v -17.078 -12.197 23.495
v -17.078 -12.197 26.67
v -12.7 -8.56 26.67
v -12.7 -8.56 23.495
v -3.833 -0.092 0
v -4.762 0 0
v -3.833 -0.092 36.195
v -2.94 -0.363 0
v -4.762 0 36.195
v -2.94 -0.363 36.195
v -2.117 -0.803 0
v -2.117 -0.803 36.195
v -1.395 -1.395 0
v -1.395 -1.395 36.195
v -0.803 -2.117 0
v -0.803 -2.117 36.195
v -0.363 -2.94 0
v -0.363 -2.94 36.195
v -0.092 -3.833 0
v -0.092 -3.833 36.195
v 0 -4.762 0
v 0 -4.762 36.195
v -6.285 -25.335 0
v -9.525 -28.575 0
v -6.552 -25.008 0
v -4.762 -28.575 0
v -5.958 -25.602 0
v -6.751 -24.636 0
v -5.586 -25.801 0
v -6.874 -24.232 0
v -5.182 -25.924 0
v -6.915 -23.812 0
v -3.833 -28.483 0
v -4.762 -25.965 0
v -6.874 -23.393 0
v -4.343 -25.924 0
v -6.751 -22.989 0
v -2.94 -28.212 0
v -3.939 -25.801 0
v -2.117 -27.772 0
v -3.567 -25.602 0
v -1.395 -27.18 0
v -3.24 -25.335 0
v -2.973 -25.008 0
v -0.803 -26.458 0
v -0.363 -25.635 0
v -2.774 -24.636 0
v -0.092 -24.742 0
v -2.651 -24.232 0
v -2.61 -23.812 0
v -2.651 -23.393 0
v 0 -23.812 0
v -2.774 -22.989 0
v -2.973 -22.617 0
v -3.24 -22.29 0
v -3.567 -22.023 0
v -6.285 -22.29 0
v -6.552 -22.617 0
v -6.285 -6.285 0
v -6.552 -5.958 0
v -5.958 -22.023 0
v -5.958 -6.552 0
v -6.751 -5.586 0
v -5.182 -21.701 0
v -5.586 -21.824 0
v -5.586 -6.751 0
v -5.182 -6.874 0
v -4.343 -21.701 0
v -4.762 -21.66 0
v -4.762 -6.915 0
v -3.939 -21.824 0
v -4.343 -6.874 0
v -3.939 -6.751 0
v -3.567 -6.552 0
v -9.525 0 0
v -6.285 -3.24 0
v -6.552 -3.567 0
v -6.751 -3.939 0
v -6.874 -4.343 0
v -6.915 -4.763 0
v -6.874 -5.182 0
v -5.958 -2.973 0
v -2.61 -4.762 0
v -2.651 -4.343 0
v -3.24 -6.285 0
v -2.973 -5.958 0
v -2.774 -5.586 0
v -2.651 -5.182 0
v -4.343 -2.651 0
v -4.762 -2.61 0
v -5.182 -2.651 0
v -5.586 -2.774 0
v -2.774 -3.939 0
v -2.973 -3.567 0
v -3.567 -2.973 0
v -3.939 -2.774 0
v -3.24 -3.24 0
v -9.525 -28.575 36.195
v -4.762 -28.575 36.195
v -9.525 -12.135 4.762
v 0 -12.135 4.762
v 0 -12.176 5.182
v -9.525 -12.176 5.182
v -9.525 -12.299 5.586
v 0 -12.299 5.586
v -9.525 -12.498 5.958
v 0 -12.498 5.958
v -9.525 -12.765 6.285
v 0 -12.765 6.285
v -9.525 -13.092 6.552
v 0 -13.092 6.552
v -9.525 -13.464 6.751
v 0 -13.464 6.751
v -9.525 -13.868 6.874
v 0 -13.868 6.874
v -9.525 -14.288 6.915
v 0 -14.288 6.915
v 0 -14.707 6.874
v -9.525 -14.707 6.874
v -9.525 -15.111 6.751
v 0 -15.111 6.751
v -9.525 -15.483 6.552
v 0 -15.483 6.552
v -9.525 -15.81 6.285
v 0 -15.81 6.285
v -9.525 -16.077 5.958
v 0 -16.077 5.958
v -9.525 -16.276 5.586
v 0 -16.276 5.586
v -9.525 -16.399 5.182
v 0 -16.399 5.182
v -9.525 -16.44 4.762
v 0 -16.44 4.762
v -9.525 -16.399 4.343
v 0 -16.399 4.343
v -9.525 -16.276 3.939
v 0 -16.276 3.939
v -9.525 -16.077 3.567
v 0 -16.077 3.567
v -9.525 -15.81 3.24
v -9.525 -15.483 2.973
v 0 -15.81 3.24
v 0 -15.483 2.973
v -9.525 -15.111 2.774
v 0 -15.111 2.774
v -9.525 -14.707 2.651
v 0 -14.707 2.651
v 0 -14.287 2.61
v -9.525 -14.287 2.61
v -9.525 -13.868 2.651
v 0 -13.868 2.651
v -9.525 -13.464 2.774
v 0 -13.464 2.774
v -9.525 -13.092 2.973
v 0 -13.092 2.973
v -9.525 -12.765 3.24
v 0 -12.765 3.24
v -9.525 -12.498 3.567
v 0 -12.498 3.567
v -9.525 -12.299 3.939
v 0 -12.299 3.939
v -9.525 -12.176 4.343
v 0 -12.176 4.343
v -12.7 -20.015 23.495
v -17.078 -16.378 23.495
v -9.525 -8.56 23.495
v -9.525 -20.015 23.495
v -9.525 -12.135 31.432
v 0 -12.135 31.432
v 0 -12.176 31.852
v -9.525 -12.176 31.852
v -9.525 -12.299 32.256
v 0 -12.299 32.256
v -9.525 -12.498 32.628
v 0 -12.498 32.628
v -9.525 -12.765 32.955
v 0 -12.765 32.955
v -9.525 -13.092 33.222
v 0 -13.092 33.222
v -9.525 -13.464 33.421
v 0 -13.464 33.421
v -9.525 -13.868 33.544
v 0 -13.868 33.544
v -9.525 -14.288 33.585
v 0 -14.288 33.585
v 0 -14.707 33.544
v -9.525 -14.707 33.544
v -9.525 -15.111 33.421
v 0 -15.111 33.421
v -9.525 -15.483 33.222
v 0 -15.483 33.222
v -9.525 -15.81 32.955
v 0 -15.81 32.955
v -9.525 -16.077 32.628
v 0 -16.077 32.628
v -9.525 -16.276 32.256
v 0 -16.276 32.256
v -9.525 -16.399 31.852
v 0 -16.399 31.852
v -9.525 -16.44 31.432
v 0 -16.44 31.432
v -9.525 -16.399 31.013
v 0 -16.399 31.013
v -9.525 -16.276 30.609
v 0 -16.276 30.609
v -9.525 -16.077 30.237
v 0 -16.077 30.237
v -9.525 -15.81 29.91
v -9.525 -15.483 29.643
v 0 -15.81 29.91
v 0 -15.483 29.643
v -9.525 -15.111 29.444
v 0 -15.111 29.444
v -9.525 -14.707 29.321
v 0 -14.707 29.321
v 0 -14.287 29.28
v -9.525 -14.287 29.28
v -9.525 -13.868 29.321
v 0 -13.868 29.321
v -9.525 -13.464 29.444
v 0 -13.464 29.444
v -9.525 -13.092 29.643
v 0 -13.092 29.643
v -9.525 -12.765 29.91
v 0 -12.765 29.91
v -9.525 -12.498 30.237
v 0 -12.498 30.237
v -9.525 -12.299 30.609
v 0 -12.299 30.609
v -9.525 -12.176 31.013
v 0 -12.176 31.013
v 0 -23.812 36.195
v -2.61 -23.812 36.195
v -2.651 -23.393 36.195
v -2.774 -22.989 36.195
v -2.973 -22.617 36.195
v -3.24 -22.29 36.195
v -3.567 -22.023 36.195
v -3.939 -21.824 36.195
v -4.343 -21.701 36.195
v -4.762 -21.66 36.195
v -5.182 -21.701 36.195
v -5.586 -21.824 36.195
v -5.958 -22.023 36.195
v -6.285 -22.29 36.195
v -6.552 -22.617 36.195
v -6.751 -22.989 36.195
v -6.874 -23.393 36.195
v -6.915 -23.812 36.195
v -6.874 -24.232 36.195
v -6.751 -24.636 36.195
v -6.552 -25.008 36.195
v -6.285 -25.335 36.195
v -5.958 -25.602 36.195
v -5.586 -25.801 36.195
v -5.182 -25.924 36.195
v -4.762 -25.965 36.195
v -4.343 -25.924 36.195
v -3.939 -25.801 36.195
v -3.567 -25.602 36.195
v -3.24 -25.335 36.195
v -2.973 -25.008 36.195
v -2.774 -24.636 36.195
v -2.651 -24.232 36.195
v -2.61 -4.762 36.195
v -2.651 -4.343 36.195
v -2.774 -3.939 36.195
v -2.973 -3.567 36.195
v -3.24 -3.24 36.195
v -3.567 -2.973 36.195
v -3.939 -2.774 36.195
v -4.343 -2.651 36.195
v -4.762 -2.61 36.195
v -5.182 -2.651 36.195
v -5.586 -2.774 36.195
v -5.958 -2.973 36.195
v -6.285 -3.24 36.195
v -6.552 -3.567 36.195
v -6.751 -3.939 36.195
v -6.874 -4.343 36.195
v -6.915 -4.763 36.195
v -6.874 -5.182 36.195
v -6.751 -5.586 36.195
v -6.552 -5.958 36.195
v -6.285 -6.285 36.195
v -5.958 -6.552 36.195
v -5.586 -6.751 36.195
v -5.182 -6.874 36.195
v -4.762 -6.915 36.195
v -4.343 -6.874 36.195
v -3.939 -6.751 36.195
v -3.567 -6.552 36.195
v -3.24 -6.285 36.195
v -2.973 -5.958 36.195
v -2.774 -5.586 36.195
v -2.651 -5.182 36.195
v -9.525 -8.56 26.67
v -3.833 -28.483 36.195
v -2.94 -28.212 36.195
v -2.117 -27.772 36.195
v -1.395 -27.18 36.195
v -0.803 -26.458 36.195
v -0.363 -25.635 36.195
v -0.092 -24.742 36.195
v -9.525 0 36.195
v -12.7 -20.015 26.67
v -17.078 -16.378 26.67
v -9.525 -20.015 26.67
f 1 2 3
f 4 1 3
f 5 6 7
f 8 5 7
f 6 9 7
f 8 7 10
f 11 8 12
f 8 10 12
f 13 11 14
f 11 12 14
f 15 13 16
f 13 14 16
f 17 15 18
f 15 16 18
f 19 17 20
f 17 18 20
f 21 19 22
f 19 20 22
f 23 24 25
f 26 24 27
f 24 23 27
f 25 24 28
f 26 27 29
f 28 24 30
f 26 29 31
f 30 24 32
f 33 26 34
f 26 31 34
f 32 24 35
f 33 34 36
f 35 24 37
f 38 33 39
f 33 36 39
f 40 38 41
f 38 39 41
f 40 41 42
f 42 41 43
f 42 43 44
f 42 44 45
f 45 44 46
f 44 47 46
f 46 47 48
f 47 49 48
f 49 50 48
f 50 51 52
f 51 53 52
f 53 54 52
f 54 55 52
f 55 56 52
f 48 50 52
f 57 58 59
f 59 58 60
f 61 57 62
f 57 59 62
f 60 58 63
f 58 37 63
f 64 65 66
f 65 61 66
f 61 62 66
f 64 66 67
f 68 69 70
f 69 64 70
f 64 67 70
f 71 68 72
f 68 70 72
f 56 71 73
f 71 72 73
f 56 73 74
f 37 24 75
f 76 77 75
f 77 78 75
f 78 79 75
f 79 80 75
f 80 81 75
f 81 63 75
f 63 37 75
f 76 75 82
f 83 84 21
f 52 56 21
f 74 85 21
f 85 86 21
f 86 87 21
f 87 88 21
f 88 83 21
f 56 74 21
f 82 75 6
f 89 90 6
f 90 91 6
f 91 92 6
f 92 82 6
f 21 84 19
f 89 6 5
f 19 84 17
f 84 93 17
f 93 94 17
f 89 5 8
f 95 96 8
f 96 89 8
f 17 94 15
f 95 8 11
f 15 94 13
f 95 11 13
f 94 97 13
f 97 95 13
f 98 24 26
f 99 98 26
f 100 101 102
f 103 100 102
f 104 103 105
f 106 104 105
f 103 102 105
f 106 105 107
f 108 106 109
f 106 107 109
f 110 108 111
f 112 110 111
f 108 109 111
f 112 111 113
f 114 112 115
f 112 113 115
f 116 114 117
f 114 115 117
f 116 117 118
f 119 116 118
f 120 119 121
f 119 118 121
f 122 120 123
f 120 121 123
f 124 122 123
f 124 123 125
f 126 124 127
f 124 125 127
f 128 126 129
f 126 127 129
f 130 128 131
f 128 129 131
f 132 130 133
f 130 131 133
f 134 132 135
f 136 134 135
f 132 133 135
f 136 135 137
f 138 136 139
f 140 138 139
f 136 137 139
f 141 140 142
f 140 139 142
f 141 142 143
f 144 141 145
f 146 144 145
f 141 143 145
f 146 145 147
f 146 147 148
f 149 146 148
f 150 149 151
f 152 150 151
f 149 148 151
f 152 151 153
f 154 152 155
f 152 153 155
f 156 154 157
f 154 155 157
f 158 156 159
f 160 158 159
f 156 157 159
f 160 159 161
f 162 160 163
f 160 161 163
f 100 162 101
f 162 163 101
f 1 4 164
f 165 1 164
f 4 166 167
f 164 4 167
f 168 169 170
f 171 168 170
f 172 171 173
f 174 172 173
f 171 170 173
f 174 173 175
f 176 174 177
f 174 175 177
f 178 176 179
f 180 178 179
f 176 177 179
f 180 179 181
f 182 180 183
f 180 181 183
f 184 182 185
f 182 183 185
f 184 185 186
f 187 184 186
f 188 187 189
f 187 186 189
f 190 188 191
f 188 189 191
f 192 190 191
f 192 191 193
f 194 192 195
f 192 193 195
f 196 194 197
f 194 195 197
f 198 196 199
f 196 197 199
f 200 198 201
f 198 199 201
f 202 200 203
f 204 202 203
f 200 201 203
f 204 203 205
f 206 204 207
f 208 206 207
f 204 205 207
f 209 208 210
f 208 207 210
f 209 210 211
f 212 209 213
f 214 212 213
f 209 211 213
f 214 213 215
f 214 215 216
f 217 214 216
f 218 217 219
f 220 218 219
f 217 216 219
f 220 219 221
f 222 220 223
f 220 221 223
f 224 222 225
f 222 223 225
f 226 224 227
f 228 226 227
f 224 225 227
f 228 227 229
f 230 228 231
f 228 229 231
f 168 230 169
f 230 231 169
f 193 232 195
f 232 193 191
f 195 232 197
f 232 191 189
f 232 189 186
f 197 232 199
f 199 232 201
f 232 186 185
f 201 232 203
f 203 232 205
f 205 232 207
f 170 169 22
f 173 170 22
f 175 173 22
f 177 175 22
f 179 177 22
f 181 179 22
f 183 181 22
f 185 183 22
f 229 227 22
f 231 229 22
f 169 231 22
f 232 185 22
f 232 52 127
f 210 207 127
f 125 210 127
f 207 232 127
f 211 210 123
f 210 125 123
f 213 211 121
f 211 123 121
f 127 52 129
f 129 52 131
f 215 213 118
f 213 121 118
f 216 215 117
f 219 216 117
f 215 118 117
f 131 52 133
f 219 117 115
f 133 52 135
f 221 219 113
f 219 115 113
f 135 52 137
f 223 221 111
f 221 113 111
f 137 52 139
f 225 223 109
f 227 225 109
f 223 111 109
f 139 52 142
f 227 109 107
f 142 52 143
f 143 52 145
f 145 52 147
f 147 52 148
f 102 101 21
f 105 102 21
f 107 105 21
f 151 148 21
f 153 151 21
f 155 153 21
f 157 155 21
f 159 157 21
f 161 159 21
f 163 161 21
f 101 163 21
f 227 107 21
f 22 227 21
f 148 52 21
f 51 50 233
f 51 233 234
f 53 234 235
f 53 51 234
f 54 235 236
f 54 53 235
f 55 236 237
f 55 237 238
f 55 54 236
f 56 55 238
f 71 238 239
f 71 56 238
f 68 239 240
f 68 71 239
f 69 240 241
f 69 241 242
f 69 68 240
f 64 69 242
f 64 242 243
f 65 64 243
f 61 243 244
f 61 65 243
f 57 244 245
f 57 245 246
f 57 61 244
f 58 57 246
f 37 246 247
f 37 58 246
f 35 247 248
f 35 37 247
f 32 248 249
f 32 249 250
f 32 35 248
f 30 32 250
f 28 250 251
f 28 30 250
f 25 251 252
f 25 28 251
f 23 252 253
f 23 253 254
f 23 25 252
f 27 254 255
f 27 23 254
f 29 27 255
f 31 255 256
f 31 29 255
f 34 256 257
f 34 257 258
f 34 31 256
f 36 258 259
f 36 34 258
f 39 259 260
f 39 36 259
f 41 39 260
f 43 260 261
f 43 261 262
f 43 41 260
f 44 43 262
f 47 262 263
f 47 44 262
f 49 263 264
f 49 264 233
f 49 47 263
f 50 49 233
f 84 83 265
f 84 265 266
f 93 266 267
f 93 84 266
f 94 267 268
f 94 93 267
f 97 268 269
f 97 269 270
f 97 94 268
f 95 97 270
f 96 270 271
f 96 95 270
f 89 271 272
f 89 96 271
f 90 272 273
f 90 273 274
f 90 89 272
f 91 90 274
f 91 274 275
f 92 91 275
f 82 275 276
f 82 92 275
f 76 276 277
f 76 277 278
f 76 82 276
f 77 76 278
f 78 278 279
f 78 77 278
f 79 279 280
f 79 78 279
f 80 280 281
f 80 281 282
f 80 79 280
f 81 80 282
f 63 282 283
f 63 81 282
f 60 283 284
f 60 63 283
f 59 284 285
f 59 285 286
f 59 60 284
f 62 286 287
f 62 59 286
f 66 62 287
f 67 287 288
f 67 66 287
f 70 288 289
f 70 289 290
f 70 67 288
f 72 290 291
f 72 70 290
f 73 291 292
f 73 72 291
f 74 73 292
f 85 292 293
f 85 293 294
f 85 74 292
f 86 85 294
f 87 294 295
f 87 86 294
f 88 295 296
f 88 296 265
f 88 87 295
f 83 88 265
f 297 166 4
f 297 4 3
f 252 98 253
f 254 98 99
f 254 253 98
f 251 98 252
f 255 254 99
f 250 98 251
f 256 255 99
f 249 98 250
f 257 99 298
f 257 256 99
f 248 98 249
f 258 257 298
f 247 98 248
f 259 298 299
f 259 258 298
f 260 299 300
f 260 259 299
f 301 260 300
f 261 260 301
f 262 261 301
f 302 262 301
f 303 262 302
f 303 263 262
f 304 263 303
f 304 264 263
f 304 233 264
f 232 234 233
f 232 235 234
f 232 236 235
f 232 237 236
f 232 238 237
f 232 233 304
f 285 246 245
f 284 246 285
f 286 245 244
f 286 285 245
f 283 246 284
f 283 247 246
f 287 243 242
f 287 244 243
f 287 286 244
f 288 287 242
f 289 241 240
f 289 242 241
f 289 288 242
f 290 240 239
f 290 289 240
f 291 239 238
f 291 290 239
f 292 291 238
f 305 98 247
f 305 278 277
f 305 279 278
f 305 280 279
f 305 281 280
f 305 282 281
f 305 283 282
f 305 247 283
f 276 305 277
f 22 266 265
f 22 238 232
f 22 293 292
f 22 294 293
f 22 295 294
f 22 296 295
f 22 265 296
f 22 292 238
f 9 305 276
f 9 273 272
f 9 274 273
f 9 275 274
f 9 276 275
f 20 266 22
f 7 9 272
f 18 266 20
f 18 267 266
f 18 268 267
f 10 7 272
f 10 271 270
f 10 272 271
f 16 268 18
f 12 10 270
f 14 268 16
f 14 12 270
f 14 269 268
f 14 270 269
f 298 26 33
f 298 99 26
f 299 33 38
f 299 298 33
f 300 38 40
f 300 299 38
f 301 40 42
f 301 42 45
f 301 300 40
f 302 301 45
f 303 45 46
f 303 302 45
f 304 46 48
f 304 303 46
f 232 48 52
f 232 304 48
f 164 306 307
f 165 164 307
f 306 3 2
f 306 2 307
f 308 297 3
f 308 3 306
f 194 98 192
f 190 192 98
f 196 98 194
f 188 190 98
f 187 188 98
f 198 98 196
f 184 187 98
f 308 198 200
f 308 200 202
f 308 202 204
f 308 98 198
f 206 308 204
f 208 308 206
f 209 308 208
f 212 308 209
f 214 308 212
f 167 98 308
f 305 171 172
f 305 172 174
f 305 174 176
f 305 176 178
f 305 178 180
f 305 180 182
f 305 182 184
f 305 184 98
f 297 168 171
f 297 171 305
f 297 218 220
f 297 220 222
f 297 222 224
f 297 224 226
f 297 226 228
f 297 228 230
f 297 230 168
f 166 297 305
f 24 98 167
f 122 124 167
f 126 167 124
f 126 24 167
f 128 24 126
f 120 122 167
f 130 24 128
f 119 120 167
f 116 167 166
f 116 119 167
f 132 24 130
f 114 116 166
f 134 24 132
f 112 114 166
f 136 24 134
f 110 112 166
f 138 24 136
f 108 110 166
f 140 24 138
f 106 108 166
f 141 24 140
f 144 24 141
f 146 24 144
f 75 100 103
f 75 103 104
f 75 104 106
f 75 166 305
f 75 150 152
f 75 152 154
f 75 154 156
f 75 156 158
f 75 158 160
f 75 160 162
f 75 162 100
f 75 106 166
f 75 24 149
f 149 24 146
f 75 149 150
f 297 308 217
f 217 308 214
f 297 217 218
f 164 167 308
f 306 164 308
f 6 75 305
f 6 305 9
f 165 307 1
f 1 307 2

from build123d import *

# Parameters (mm, degrees)
F0_W     = 9.525
F0_H     = 28.575
F0_R     = 2.15265
F1_DEPTH = 36.195
F2_R     = 2.15265
F3_DEPTH = 9.525
F4_R     = 4.7625
F5_W     = 11.45515
F5_H     = 3.175
F6_DEPTH = 25.4
F8_DEPTH = 3.175


with BuildPart() as f1:
    # F0 (on Top) → F1 (new body)
    with BuildSketch(Plane.XY):
        with Locations((-4.7625, -14.2875)):
            Rectangle(F0_W, F0_H)
        with Locations((-4.7625, -23.8125)):
            Circle(F0_R, mode=Mode.SUBTRACT)
        with Locations((-4.7625, -4.7625)):
            Circle(F0_R, mode=Mode.SUBTRACT)
    extrude(amount=F1_DEPTH)

    # F2 (on face) → F3 (cut, through all)
    with BuildSketch(Plane.YZ):
        with Locations((-14.2875, 31.4325)):
            Circle(F2_R)
        with Locations((-14.2875, 4.7625)):
            Circle(F2_R)
    extrude(amount=-F3_DEPTH, mode=Mode.SUBTRACT)

    # F4
    f4_edges = [f1.edges().sort_by_distance(p)[0] for p in [
        (0, -28.575, 18.0975),
        (0, 0, 18.0975),
    ]]
    fillet(f4_edges, radius=F4_R)

    # F5 (on face) → F6 (join)
    with BuildSketch(Plane(origin=(-9.525, 0, 0), x_dir=(0, -1, 0), z_dir=(-1, 0, 0))):
        with Locations((14.2875, 25.0825)):
            Rectangle(F5_W, F5_H)
    extrude(amount=F6_DEPTH)

    # F7 (on face) → F8 (cut, through all)
    with BuildSketch(Plane.XY.offset(26.67)):
        Polygon((-12.7, -8.559925), (-34.925, -8.559925), (-34.925, -20.015075), (-12.7, -20.015075), (-17.077984, -16.377956), (-17.077984, -12.197044), align=None)
    extrude(amount=-F8_DEPTH, mode=Mode.SUBTRACT)


solid = f1.part
